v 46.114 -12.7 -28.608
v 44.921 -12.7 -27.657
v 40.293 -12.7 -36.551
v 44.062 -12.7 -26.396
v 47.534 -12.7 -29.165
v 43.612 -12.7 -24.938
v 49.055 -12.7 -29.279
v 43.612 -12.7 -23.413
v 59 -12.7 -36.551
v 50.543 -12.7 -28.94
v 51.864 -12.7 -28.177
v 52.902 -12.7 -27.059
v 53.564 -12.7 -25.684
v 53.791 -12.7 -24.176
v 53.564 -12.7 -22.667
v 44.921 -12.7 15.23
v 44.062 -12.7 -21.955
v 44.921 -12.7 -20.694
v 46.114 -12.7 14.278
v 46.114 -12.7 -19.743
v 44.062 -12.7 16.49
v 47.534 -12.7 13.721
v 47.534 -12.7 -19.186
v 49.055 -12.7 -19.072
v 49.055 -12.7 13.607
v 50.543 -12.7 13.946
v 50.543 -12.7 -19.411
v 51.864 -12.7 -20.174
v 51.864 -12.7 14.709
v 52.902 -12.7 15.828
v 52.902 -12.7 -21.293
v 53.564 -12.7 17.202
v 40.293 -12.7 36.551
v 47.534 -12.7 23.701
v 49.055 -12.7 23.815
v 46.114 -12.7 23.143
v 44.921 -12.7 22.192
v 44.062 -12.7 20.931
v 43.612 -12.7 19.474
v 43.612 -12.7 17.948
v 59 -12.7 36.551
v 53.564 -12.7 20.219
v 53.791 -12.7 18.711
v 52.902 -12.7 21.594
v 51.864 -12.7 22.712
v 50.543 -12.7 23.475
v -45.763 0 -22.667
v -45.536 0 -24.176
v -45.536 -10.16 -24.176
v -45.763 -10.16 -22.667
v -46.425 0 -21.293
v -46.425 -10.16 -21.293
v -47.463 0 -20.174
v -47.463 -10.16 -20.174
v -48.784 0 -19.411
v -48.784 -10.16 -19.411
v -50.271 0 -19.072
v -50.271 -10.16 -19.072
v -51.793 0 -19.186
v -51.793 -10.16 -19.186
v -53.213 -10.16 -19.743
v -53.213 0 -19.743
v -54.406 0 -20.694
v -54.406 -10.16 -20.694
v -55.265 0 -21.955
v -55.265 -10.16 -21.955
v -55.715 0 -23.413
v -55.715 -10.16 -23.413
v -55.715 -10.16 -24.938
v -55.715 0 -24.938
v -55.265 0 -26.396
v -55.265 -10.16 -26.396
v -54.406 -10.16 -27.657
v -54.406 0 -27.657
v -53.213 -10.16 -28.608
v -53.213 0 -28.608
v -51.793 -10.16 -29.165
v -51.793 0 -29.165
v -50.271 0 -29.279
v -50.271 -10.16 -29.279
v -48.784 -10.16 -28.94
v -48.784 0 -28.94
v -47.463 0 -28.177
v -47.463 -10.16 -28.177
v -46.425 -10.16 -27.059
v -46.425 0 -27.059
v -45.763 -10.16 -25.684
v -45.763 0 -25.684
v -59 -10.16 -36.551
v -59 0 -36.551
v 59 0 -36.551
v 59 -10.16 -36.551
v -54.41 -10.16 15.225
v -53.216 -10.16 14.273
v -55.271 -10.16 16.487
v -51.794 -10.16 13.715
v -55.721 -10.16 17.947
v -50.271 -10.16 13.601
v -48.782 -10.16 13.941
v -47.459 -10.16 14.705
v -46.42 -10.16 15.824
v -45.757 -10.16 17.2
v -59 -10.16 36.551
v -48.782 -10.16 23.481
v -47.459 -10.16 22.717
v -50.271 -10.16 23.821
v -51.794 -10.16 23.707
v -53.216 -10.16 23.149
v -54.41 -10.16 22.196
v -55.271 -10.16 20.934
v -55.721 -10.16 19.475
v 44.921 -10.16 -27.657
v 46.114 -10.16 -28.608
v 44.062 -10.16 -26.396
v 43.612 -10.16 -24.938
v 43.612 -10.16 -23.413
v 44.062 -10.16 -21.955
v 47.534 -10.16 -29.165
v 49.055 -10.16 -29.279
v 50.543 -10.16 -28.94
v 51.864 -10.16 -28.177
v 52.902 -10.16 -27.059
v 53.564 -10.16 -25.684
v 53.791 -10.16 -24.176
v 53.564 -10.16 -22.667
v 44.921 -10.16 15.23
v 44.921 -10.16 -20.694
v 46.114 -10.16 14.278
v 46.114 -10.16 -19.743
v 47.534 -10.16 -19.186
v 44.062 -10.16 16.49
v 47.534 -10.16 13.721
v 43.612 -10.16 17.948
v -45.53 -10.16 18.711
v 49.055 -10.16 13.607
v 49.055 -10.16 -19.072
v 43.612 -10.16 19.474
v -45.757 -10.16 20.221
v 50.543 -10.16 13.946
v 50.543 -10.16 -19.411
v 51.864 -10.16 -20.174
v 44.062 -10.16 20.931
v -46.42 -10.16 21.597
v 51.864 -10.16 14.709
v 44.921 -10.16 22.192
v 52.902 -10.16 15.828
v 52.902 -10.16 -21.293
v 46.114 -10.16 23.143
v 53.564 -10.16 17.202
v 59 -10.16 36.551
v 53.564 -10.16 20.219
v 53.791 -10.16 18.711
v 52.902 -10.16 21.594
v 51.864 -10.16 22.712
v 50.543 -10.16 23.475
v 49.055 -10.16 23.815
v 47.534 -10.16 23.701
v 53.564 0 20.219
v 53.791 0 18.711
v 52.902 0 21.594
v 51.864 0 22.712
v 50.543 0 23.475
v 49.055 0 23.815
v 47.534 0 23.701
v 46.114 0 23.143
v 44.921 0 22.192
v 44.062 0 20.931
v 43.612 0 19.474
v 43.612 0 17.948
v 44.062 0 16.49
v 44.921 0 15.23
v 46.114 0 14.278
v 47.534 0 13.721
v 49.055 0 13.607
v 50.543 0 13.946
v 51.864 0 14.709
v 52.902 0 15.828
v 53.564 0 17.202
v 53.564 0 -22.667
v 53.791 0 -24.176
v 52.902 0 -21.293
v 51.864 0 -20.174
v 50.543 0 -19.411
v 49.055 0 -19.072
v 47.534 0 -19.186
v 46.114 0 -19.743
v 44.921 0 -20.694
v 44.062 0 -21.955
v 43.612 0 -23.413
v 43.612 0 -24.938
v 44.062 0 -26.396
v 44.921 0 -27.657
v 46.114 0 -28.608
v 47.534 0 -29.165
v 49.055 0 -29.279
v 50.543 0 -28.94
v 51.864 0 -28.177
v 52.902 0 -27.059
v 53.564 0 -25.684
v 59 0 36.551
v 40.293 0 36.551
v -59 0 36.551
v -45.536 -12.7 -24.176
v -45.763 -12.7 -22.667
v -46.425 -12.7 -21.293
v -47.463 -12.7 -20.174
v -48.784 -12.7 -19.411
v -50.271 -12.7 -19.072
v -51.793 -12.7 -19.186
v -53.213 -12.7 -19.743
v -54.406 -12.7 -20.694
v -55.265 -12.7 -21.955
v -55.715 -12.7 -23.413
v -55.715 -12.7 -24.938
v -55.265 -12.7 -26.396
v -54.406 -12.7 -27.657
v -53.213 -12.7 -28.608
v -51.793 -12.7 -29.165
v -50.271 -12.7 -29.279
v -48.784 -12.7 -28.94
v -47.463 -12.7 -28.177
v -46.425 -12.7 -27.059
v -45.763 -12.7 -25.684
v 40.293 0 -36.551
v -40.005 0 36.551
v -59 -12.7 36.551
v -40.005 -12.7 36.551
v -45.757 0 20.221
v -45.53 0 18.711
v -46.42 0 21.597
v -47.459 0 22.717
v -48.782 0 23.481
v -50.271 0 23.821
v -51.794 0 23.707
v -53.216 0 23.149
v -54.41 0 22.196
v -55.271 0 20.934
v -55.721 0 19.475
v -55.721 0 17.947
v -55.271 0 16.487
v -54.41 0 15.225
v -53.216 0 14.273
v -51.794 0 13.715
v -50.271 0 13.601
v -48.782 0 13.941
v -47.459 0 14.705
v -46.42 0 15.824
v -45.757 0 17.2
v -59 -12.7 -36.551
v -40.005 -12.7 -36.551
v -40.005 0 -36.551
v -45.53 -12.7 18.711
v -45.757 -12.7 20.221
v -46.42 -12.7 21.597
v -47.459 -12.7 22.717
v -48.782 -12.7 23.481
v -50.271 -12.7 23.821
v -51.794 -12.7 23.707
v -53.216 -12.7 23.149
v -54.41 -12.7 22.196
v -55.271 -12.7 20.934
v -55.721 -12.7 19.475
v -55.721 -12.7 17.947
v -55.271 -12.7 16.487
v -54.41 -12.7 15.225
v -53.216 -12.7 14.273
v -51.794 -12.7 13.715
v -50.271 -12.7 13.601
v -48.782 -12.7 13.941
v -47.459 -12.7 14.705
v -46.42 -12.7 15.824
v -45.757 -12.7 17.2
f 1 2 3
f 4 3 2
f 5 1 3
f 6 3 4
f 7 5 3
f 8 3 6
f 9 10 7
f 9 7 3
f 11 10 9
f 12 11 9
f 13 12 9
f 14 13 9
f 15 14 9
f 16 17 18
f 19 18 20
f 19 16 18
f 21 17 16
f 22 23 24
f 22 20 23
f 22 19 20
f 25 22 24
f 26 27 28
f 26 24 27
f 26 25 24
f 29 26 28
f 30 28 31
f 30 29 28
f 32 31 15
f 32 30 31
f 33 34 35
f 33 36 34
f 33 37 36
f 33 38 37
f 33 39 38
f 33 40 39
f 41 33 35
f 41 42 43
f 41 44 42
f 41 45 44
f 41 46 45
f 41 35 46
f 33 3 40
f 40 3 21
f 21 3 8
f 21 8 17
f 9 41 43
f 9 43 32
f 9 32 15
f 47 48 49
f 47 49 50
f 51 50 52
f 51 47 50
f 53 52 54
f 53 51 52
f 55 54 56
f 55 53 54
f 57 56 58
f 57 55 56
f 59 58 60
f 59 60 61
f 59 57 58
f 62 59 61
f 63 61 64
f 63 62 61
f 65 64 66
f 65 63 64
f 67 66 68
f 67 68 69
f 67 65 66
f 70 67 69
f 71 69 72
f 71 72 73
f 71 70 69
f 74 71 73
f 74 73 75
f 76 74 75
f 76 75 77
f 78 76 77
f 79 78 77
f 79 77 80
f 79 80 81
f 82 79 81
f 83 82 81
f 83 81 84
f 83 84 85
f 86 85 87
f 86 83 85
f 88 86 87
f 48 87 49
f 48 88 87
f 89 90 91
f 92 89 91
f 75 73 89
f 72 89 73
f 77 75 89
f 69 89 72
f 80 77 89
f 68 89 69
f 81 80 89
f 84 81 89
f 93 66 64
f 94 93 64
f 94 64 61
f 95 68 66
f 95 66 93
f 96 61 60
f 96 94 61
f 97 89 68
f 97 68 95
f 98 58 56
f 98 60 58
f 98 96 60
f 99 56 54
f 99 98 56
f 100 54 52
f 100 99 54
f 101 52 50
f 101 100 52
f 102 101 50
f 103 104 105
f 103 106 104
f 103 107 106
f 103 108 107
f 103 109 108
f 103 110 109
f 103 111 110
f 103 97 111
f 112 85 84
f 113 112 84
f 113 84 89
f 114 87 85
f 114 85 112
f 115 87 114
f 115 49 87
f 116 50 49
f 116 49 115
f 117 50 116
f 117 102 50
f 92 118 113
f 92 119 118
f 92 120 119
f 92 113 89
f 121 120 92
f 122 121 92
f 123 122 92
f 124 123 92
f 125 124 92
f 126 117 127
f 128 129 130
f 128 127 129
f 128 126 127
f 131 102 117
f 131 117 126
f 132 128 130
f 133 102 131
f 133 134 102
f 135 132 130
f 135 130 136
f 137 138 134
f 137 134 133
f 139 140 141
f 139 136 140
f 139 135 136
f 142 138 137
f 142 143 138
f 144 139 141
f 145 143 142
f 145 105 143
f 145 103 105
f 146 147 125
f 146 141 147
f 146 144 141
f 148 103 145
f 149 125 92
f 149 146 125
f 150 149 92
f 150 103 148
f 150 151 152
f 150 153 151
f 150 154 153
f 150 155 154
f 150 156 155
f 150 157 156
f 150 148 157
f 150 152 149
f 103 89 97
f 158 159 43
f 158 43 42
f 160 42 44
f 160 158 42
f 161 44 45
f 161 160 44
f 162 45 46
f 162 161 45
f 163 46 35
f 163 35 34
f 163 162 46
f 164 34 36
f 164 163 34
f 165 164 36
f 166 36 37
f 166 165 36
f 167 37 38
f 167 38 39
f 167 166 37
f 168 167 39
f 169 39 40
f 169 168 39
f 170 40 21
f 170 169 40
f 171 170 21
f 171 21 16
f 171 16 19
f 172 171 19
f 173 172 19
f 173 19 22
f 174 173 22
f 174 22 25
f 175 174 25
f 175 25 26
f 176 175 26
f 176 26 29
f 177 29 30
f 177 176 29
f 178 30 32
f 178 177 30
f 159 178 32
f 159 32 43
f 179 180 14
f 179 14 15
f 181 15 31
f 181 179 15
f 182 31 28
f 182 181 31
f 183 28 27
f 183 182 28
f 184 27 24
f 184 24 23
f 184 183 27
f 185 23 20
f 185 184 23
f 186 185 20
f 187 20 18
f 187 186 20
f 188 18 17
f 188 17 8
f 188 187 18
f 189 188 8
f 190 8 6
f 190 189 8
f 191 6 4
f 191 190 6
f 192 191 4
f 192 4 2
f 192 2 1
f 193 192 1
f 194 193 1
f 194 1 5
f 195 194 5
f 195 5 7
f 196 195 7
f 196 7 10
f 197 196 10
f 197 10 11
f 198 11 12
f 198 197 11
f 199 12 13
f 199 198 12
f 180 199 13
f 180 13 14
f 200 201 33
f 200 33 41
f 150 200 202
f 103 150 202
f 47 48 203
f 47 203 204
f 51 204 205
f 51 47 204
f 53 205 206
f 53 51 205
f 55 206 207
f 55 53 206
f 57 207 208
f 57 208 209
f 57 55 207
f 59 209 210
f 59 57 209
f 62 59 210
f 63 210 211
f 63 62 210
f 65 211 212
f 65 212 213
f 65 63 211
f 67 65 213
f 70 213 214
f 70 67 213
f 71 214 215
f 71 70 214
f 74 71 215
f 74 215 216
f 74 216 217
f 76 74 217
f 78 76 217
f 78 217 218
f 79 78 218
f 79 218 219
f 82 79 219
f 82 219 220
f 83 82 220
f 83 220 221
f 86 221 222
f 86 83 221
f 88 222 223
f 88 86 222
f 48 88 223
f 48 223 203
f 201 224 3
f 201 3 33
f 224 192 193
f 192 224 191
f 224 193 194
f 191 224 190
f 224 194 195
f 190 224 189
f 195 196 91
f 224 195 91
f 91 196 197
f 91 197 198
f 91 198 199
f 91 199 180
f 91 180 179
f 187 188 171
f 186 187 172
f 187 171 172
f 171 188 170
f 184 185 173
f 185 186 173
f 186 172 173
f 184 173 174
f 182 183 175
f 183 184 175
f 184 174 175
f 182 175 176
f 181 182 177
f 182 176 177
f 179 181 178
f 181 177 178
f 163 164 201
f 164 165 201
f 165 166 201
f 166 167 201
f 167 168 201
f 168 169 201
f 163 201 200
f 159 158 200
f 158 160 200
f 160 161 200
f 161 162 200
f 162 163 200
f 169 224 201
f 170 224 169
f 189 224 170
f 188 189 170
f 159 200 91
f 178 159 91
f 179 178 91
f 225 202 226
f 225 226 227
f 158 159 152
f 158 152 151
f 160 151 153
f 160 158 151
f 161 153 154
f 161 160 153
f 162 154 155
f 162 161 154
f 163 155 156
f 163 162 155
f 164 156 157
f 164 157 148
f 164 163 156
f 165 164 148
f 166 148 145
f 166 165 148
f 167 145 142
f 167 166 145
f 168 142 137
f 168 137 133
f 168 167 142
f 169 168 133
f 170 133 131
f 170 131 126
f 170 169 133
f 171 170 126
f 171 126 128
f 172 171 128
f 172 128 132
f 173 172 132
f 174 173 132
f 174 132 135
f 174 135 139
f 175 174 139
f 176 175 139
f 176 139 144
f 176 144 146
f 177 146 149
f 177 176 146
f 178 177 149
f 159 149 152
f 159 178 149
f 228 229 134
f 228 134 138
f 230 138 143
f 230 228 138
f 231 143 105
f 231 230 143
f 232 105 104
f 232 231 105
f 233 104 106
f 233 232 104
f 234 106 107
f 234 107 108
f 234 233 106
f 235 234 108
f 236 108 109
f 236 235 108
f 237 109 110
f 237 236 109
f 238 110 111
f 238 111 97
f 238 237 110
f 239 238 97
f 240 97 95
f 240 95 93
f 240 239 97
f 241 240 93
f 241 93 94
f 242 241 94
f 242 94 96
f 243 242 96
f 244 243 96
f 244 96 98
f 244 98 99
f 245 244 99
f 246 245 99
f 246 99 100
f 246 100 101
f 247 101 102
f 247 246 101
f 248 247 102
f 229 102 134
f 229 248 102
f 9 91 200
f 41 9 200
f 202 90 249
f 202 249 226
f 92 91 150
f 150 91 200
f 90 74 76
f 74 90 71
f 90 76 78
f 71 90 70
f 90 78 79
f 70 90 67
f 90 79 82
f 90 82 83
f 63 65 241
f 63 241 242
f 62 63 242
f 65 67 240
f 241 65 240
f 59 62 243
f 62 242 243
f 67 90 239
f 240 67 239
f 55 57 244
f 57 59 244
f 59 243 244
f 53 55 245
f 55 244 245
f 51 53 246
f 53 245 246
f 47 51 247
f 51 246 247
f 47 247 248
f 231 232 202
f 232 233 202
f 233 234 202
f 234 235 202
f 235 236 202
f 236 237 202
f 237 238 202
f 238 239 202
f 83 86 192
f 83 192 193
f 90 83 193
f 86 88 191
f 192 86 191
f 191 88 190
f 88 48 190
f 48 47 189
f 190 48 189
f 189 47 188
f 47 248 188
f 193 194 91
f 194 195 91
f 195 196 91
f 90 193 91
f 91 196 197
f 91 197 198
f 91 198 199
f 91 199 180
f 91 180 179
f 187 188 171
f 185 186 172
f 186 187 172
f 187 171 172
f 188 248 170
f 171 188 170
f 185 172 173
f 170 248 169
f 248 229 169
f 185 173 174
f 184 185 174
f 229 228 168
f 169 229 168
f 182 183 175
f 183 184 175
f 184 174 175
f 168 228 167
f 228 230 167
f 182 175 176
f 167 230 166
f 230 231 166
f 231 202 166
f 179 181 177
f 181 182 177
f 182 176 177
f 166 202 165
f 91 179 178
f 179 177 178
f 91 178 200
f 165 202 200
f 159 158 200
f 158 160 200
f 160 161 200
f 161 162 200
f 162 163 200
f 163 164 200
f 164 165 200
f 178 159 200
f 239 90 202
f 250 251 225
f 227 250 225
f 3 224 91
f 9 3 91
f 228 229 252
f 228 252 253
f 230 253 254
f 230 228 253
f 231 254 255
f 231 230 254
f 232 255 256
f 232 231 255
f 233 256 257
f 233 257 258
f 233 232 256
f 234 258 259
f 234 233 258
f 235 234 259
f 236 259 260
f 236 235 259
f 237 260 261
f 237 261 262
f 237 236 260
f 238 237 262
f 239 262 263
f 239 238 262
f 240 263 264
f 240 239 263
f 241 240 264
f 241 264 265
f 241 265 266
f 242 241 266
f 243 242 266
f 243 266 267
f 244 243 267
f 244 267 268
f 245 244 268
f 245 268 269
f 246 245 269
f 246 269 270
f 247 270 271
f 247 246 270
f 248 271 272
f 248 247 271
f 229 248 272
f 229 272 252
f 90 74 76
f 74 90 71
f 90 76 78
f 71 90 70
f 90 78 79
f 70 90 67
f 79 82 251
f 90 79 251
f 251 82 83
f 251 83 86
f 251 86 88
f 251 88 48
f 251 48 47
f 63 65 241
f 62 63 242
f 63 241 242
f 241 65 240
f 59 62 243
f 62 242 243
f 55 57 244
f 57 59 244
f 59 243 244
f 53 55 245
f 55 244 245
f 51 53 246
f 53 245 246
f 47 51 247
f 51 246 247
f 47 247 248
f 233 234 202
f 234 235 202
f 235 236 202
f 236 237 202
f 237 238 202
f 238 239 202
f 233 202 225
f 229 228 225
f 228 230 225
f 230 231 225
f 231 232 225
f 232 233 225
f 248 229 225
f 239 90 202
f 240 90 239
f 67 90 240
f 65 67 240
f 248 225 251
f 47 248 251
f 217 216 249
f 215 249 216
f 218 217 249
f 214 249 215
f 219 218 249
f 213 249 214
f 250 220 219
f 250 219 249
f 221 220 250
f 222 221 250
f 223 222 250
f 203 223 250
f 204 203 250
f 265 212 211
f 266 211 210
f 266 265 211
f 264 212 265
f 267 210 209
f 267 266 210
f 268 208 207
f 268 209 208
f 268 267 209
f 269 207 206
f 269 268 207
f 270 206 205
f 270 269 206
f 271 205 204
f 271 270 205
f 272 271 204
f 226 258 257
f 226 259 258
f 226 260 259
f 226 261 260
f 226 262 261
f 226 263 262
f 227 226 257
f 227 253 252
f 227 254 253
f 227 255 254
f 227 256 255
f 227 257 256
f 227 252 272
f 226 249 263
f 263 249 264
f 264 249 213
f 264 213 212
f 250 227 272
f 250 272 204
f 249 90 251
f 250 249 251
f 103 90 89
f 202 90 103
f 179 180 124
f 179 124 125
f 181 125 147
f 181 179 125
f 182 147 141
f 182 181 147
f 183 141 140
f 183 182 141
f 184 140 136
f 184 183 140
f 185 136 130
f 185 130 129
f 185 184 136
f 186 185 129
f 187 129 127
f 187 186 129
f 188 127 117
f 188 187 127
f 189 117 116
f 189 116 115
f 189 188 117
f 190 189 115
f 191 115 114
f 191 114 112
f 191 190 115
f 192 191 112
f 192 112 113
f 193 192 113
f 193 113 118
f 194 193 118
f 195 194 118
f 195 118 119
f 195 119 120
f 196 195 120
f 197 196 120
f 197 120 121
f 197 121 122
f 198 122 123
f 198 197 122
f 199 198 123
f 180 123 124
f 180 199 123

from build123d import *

# Parameters (mm, degrees)
F0_W     = 18.9951807261
F0_H     = 73.1026604772
F0_R     = 5.1181
F0_R_2   = 5.1242350944
F1_DEPTH = 12.7
F0_W_2   = 18.7073759735
F0_W_3   = 80.2978090942
F2_DEPTH = 10.16


with BuildPart() as f1:
    # F0 (on Front) → F1 (new body)
    with BuildSketch(Plane.XZ):
        with Locations((-49.5025925338, 0)):
            Rectangle(F0_W, F0_H)
        with Locations((-50.6538152695, -24.1756830364)):
            Circle(F0_R, mode=Mode.SUBTRACT)
        with Locations((-50.6538152695, 18.7107970397)):
            Circle(F0_R_2, mode=Mode.SUBTRACT)
    extrude(amount=F1_DEPTH)


with BuildPart() as f1b:
    # F0 (on Front) → F1, piece 2 (new body)
    with BuildSketch(Plane.XZ):
        with Locations((49.6464949101, 0)):
            Rectangle(F0_W_2, F0_H)
        with Locations((48.6729510283, -24.1756830364)):
            Circle(F0_R, mode=Mode.SUBTRACT)
        with Locations((48.6729510283, 18.7107970397)):
            Circle(F0_R, mode=Mode.SUBTRACT)
    extrude(amount=F1_DEPTH)


with BuildPart() as f2:
    # F0 (on Front) → F2 (new body)
    with BuildSketch(Plane.XZ):
        with Locations((49.6464949101, 0)):
            Rectangle(F0_W_2, F0_H)
        with Locations((48.6729510283, -24.1756830364)):
            Circle(F0_R, mode=Mode.SUBTRACT)
        with Locations((48.6729510283, 18.7107970397)):
            Circle(F0_R, mode=Mode.SUBTRACT)
        with Locations((0.1439023763, 0)):
            Rectangle(F0_W_3, F0_H)
        with Locations((-49.5025925338, 0)):
            Rectangle(F0_W, F0_H)
        with Locations((-50.6538152695, -24.1756830364)):
            Circle(F0_R, mode=Mode.SUBTRACT)
        with Locations((-50.6538152695, 18.7107970397)):
            Circle(F0_R_2, mode=Mode.SUBTRACT)
    extrude(amount=F2_DEPTH)


solid = Compound([f1.part, f1b.part, f2.part])
